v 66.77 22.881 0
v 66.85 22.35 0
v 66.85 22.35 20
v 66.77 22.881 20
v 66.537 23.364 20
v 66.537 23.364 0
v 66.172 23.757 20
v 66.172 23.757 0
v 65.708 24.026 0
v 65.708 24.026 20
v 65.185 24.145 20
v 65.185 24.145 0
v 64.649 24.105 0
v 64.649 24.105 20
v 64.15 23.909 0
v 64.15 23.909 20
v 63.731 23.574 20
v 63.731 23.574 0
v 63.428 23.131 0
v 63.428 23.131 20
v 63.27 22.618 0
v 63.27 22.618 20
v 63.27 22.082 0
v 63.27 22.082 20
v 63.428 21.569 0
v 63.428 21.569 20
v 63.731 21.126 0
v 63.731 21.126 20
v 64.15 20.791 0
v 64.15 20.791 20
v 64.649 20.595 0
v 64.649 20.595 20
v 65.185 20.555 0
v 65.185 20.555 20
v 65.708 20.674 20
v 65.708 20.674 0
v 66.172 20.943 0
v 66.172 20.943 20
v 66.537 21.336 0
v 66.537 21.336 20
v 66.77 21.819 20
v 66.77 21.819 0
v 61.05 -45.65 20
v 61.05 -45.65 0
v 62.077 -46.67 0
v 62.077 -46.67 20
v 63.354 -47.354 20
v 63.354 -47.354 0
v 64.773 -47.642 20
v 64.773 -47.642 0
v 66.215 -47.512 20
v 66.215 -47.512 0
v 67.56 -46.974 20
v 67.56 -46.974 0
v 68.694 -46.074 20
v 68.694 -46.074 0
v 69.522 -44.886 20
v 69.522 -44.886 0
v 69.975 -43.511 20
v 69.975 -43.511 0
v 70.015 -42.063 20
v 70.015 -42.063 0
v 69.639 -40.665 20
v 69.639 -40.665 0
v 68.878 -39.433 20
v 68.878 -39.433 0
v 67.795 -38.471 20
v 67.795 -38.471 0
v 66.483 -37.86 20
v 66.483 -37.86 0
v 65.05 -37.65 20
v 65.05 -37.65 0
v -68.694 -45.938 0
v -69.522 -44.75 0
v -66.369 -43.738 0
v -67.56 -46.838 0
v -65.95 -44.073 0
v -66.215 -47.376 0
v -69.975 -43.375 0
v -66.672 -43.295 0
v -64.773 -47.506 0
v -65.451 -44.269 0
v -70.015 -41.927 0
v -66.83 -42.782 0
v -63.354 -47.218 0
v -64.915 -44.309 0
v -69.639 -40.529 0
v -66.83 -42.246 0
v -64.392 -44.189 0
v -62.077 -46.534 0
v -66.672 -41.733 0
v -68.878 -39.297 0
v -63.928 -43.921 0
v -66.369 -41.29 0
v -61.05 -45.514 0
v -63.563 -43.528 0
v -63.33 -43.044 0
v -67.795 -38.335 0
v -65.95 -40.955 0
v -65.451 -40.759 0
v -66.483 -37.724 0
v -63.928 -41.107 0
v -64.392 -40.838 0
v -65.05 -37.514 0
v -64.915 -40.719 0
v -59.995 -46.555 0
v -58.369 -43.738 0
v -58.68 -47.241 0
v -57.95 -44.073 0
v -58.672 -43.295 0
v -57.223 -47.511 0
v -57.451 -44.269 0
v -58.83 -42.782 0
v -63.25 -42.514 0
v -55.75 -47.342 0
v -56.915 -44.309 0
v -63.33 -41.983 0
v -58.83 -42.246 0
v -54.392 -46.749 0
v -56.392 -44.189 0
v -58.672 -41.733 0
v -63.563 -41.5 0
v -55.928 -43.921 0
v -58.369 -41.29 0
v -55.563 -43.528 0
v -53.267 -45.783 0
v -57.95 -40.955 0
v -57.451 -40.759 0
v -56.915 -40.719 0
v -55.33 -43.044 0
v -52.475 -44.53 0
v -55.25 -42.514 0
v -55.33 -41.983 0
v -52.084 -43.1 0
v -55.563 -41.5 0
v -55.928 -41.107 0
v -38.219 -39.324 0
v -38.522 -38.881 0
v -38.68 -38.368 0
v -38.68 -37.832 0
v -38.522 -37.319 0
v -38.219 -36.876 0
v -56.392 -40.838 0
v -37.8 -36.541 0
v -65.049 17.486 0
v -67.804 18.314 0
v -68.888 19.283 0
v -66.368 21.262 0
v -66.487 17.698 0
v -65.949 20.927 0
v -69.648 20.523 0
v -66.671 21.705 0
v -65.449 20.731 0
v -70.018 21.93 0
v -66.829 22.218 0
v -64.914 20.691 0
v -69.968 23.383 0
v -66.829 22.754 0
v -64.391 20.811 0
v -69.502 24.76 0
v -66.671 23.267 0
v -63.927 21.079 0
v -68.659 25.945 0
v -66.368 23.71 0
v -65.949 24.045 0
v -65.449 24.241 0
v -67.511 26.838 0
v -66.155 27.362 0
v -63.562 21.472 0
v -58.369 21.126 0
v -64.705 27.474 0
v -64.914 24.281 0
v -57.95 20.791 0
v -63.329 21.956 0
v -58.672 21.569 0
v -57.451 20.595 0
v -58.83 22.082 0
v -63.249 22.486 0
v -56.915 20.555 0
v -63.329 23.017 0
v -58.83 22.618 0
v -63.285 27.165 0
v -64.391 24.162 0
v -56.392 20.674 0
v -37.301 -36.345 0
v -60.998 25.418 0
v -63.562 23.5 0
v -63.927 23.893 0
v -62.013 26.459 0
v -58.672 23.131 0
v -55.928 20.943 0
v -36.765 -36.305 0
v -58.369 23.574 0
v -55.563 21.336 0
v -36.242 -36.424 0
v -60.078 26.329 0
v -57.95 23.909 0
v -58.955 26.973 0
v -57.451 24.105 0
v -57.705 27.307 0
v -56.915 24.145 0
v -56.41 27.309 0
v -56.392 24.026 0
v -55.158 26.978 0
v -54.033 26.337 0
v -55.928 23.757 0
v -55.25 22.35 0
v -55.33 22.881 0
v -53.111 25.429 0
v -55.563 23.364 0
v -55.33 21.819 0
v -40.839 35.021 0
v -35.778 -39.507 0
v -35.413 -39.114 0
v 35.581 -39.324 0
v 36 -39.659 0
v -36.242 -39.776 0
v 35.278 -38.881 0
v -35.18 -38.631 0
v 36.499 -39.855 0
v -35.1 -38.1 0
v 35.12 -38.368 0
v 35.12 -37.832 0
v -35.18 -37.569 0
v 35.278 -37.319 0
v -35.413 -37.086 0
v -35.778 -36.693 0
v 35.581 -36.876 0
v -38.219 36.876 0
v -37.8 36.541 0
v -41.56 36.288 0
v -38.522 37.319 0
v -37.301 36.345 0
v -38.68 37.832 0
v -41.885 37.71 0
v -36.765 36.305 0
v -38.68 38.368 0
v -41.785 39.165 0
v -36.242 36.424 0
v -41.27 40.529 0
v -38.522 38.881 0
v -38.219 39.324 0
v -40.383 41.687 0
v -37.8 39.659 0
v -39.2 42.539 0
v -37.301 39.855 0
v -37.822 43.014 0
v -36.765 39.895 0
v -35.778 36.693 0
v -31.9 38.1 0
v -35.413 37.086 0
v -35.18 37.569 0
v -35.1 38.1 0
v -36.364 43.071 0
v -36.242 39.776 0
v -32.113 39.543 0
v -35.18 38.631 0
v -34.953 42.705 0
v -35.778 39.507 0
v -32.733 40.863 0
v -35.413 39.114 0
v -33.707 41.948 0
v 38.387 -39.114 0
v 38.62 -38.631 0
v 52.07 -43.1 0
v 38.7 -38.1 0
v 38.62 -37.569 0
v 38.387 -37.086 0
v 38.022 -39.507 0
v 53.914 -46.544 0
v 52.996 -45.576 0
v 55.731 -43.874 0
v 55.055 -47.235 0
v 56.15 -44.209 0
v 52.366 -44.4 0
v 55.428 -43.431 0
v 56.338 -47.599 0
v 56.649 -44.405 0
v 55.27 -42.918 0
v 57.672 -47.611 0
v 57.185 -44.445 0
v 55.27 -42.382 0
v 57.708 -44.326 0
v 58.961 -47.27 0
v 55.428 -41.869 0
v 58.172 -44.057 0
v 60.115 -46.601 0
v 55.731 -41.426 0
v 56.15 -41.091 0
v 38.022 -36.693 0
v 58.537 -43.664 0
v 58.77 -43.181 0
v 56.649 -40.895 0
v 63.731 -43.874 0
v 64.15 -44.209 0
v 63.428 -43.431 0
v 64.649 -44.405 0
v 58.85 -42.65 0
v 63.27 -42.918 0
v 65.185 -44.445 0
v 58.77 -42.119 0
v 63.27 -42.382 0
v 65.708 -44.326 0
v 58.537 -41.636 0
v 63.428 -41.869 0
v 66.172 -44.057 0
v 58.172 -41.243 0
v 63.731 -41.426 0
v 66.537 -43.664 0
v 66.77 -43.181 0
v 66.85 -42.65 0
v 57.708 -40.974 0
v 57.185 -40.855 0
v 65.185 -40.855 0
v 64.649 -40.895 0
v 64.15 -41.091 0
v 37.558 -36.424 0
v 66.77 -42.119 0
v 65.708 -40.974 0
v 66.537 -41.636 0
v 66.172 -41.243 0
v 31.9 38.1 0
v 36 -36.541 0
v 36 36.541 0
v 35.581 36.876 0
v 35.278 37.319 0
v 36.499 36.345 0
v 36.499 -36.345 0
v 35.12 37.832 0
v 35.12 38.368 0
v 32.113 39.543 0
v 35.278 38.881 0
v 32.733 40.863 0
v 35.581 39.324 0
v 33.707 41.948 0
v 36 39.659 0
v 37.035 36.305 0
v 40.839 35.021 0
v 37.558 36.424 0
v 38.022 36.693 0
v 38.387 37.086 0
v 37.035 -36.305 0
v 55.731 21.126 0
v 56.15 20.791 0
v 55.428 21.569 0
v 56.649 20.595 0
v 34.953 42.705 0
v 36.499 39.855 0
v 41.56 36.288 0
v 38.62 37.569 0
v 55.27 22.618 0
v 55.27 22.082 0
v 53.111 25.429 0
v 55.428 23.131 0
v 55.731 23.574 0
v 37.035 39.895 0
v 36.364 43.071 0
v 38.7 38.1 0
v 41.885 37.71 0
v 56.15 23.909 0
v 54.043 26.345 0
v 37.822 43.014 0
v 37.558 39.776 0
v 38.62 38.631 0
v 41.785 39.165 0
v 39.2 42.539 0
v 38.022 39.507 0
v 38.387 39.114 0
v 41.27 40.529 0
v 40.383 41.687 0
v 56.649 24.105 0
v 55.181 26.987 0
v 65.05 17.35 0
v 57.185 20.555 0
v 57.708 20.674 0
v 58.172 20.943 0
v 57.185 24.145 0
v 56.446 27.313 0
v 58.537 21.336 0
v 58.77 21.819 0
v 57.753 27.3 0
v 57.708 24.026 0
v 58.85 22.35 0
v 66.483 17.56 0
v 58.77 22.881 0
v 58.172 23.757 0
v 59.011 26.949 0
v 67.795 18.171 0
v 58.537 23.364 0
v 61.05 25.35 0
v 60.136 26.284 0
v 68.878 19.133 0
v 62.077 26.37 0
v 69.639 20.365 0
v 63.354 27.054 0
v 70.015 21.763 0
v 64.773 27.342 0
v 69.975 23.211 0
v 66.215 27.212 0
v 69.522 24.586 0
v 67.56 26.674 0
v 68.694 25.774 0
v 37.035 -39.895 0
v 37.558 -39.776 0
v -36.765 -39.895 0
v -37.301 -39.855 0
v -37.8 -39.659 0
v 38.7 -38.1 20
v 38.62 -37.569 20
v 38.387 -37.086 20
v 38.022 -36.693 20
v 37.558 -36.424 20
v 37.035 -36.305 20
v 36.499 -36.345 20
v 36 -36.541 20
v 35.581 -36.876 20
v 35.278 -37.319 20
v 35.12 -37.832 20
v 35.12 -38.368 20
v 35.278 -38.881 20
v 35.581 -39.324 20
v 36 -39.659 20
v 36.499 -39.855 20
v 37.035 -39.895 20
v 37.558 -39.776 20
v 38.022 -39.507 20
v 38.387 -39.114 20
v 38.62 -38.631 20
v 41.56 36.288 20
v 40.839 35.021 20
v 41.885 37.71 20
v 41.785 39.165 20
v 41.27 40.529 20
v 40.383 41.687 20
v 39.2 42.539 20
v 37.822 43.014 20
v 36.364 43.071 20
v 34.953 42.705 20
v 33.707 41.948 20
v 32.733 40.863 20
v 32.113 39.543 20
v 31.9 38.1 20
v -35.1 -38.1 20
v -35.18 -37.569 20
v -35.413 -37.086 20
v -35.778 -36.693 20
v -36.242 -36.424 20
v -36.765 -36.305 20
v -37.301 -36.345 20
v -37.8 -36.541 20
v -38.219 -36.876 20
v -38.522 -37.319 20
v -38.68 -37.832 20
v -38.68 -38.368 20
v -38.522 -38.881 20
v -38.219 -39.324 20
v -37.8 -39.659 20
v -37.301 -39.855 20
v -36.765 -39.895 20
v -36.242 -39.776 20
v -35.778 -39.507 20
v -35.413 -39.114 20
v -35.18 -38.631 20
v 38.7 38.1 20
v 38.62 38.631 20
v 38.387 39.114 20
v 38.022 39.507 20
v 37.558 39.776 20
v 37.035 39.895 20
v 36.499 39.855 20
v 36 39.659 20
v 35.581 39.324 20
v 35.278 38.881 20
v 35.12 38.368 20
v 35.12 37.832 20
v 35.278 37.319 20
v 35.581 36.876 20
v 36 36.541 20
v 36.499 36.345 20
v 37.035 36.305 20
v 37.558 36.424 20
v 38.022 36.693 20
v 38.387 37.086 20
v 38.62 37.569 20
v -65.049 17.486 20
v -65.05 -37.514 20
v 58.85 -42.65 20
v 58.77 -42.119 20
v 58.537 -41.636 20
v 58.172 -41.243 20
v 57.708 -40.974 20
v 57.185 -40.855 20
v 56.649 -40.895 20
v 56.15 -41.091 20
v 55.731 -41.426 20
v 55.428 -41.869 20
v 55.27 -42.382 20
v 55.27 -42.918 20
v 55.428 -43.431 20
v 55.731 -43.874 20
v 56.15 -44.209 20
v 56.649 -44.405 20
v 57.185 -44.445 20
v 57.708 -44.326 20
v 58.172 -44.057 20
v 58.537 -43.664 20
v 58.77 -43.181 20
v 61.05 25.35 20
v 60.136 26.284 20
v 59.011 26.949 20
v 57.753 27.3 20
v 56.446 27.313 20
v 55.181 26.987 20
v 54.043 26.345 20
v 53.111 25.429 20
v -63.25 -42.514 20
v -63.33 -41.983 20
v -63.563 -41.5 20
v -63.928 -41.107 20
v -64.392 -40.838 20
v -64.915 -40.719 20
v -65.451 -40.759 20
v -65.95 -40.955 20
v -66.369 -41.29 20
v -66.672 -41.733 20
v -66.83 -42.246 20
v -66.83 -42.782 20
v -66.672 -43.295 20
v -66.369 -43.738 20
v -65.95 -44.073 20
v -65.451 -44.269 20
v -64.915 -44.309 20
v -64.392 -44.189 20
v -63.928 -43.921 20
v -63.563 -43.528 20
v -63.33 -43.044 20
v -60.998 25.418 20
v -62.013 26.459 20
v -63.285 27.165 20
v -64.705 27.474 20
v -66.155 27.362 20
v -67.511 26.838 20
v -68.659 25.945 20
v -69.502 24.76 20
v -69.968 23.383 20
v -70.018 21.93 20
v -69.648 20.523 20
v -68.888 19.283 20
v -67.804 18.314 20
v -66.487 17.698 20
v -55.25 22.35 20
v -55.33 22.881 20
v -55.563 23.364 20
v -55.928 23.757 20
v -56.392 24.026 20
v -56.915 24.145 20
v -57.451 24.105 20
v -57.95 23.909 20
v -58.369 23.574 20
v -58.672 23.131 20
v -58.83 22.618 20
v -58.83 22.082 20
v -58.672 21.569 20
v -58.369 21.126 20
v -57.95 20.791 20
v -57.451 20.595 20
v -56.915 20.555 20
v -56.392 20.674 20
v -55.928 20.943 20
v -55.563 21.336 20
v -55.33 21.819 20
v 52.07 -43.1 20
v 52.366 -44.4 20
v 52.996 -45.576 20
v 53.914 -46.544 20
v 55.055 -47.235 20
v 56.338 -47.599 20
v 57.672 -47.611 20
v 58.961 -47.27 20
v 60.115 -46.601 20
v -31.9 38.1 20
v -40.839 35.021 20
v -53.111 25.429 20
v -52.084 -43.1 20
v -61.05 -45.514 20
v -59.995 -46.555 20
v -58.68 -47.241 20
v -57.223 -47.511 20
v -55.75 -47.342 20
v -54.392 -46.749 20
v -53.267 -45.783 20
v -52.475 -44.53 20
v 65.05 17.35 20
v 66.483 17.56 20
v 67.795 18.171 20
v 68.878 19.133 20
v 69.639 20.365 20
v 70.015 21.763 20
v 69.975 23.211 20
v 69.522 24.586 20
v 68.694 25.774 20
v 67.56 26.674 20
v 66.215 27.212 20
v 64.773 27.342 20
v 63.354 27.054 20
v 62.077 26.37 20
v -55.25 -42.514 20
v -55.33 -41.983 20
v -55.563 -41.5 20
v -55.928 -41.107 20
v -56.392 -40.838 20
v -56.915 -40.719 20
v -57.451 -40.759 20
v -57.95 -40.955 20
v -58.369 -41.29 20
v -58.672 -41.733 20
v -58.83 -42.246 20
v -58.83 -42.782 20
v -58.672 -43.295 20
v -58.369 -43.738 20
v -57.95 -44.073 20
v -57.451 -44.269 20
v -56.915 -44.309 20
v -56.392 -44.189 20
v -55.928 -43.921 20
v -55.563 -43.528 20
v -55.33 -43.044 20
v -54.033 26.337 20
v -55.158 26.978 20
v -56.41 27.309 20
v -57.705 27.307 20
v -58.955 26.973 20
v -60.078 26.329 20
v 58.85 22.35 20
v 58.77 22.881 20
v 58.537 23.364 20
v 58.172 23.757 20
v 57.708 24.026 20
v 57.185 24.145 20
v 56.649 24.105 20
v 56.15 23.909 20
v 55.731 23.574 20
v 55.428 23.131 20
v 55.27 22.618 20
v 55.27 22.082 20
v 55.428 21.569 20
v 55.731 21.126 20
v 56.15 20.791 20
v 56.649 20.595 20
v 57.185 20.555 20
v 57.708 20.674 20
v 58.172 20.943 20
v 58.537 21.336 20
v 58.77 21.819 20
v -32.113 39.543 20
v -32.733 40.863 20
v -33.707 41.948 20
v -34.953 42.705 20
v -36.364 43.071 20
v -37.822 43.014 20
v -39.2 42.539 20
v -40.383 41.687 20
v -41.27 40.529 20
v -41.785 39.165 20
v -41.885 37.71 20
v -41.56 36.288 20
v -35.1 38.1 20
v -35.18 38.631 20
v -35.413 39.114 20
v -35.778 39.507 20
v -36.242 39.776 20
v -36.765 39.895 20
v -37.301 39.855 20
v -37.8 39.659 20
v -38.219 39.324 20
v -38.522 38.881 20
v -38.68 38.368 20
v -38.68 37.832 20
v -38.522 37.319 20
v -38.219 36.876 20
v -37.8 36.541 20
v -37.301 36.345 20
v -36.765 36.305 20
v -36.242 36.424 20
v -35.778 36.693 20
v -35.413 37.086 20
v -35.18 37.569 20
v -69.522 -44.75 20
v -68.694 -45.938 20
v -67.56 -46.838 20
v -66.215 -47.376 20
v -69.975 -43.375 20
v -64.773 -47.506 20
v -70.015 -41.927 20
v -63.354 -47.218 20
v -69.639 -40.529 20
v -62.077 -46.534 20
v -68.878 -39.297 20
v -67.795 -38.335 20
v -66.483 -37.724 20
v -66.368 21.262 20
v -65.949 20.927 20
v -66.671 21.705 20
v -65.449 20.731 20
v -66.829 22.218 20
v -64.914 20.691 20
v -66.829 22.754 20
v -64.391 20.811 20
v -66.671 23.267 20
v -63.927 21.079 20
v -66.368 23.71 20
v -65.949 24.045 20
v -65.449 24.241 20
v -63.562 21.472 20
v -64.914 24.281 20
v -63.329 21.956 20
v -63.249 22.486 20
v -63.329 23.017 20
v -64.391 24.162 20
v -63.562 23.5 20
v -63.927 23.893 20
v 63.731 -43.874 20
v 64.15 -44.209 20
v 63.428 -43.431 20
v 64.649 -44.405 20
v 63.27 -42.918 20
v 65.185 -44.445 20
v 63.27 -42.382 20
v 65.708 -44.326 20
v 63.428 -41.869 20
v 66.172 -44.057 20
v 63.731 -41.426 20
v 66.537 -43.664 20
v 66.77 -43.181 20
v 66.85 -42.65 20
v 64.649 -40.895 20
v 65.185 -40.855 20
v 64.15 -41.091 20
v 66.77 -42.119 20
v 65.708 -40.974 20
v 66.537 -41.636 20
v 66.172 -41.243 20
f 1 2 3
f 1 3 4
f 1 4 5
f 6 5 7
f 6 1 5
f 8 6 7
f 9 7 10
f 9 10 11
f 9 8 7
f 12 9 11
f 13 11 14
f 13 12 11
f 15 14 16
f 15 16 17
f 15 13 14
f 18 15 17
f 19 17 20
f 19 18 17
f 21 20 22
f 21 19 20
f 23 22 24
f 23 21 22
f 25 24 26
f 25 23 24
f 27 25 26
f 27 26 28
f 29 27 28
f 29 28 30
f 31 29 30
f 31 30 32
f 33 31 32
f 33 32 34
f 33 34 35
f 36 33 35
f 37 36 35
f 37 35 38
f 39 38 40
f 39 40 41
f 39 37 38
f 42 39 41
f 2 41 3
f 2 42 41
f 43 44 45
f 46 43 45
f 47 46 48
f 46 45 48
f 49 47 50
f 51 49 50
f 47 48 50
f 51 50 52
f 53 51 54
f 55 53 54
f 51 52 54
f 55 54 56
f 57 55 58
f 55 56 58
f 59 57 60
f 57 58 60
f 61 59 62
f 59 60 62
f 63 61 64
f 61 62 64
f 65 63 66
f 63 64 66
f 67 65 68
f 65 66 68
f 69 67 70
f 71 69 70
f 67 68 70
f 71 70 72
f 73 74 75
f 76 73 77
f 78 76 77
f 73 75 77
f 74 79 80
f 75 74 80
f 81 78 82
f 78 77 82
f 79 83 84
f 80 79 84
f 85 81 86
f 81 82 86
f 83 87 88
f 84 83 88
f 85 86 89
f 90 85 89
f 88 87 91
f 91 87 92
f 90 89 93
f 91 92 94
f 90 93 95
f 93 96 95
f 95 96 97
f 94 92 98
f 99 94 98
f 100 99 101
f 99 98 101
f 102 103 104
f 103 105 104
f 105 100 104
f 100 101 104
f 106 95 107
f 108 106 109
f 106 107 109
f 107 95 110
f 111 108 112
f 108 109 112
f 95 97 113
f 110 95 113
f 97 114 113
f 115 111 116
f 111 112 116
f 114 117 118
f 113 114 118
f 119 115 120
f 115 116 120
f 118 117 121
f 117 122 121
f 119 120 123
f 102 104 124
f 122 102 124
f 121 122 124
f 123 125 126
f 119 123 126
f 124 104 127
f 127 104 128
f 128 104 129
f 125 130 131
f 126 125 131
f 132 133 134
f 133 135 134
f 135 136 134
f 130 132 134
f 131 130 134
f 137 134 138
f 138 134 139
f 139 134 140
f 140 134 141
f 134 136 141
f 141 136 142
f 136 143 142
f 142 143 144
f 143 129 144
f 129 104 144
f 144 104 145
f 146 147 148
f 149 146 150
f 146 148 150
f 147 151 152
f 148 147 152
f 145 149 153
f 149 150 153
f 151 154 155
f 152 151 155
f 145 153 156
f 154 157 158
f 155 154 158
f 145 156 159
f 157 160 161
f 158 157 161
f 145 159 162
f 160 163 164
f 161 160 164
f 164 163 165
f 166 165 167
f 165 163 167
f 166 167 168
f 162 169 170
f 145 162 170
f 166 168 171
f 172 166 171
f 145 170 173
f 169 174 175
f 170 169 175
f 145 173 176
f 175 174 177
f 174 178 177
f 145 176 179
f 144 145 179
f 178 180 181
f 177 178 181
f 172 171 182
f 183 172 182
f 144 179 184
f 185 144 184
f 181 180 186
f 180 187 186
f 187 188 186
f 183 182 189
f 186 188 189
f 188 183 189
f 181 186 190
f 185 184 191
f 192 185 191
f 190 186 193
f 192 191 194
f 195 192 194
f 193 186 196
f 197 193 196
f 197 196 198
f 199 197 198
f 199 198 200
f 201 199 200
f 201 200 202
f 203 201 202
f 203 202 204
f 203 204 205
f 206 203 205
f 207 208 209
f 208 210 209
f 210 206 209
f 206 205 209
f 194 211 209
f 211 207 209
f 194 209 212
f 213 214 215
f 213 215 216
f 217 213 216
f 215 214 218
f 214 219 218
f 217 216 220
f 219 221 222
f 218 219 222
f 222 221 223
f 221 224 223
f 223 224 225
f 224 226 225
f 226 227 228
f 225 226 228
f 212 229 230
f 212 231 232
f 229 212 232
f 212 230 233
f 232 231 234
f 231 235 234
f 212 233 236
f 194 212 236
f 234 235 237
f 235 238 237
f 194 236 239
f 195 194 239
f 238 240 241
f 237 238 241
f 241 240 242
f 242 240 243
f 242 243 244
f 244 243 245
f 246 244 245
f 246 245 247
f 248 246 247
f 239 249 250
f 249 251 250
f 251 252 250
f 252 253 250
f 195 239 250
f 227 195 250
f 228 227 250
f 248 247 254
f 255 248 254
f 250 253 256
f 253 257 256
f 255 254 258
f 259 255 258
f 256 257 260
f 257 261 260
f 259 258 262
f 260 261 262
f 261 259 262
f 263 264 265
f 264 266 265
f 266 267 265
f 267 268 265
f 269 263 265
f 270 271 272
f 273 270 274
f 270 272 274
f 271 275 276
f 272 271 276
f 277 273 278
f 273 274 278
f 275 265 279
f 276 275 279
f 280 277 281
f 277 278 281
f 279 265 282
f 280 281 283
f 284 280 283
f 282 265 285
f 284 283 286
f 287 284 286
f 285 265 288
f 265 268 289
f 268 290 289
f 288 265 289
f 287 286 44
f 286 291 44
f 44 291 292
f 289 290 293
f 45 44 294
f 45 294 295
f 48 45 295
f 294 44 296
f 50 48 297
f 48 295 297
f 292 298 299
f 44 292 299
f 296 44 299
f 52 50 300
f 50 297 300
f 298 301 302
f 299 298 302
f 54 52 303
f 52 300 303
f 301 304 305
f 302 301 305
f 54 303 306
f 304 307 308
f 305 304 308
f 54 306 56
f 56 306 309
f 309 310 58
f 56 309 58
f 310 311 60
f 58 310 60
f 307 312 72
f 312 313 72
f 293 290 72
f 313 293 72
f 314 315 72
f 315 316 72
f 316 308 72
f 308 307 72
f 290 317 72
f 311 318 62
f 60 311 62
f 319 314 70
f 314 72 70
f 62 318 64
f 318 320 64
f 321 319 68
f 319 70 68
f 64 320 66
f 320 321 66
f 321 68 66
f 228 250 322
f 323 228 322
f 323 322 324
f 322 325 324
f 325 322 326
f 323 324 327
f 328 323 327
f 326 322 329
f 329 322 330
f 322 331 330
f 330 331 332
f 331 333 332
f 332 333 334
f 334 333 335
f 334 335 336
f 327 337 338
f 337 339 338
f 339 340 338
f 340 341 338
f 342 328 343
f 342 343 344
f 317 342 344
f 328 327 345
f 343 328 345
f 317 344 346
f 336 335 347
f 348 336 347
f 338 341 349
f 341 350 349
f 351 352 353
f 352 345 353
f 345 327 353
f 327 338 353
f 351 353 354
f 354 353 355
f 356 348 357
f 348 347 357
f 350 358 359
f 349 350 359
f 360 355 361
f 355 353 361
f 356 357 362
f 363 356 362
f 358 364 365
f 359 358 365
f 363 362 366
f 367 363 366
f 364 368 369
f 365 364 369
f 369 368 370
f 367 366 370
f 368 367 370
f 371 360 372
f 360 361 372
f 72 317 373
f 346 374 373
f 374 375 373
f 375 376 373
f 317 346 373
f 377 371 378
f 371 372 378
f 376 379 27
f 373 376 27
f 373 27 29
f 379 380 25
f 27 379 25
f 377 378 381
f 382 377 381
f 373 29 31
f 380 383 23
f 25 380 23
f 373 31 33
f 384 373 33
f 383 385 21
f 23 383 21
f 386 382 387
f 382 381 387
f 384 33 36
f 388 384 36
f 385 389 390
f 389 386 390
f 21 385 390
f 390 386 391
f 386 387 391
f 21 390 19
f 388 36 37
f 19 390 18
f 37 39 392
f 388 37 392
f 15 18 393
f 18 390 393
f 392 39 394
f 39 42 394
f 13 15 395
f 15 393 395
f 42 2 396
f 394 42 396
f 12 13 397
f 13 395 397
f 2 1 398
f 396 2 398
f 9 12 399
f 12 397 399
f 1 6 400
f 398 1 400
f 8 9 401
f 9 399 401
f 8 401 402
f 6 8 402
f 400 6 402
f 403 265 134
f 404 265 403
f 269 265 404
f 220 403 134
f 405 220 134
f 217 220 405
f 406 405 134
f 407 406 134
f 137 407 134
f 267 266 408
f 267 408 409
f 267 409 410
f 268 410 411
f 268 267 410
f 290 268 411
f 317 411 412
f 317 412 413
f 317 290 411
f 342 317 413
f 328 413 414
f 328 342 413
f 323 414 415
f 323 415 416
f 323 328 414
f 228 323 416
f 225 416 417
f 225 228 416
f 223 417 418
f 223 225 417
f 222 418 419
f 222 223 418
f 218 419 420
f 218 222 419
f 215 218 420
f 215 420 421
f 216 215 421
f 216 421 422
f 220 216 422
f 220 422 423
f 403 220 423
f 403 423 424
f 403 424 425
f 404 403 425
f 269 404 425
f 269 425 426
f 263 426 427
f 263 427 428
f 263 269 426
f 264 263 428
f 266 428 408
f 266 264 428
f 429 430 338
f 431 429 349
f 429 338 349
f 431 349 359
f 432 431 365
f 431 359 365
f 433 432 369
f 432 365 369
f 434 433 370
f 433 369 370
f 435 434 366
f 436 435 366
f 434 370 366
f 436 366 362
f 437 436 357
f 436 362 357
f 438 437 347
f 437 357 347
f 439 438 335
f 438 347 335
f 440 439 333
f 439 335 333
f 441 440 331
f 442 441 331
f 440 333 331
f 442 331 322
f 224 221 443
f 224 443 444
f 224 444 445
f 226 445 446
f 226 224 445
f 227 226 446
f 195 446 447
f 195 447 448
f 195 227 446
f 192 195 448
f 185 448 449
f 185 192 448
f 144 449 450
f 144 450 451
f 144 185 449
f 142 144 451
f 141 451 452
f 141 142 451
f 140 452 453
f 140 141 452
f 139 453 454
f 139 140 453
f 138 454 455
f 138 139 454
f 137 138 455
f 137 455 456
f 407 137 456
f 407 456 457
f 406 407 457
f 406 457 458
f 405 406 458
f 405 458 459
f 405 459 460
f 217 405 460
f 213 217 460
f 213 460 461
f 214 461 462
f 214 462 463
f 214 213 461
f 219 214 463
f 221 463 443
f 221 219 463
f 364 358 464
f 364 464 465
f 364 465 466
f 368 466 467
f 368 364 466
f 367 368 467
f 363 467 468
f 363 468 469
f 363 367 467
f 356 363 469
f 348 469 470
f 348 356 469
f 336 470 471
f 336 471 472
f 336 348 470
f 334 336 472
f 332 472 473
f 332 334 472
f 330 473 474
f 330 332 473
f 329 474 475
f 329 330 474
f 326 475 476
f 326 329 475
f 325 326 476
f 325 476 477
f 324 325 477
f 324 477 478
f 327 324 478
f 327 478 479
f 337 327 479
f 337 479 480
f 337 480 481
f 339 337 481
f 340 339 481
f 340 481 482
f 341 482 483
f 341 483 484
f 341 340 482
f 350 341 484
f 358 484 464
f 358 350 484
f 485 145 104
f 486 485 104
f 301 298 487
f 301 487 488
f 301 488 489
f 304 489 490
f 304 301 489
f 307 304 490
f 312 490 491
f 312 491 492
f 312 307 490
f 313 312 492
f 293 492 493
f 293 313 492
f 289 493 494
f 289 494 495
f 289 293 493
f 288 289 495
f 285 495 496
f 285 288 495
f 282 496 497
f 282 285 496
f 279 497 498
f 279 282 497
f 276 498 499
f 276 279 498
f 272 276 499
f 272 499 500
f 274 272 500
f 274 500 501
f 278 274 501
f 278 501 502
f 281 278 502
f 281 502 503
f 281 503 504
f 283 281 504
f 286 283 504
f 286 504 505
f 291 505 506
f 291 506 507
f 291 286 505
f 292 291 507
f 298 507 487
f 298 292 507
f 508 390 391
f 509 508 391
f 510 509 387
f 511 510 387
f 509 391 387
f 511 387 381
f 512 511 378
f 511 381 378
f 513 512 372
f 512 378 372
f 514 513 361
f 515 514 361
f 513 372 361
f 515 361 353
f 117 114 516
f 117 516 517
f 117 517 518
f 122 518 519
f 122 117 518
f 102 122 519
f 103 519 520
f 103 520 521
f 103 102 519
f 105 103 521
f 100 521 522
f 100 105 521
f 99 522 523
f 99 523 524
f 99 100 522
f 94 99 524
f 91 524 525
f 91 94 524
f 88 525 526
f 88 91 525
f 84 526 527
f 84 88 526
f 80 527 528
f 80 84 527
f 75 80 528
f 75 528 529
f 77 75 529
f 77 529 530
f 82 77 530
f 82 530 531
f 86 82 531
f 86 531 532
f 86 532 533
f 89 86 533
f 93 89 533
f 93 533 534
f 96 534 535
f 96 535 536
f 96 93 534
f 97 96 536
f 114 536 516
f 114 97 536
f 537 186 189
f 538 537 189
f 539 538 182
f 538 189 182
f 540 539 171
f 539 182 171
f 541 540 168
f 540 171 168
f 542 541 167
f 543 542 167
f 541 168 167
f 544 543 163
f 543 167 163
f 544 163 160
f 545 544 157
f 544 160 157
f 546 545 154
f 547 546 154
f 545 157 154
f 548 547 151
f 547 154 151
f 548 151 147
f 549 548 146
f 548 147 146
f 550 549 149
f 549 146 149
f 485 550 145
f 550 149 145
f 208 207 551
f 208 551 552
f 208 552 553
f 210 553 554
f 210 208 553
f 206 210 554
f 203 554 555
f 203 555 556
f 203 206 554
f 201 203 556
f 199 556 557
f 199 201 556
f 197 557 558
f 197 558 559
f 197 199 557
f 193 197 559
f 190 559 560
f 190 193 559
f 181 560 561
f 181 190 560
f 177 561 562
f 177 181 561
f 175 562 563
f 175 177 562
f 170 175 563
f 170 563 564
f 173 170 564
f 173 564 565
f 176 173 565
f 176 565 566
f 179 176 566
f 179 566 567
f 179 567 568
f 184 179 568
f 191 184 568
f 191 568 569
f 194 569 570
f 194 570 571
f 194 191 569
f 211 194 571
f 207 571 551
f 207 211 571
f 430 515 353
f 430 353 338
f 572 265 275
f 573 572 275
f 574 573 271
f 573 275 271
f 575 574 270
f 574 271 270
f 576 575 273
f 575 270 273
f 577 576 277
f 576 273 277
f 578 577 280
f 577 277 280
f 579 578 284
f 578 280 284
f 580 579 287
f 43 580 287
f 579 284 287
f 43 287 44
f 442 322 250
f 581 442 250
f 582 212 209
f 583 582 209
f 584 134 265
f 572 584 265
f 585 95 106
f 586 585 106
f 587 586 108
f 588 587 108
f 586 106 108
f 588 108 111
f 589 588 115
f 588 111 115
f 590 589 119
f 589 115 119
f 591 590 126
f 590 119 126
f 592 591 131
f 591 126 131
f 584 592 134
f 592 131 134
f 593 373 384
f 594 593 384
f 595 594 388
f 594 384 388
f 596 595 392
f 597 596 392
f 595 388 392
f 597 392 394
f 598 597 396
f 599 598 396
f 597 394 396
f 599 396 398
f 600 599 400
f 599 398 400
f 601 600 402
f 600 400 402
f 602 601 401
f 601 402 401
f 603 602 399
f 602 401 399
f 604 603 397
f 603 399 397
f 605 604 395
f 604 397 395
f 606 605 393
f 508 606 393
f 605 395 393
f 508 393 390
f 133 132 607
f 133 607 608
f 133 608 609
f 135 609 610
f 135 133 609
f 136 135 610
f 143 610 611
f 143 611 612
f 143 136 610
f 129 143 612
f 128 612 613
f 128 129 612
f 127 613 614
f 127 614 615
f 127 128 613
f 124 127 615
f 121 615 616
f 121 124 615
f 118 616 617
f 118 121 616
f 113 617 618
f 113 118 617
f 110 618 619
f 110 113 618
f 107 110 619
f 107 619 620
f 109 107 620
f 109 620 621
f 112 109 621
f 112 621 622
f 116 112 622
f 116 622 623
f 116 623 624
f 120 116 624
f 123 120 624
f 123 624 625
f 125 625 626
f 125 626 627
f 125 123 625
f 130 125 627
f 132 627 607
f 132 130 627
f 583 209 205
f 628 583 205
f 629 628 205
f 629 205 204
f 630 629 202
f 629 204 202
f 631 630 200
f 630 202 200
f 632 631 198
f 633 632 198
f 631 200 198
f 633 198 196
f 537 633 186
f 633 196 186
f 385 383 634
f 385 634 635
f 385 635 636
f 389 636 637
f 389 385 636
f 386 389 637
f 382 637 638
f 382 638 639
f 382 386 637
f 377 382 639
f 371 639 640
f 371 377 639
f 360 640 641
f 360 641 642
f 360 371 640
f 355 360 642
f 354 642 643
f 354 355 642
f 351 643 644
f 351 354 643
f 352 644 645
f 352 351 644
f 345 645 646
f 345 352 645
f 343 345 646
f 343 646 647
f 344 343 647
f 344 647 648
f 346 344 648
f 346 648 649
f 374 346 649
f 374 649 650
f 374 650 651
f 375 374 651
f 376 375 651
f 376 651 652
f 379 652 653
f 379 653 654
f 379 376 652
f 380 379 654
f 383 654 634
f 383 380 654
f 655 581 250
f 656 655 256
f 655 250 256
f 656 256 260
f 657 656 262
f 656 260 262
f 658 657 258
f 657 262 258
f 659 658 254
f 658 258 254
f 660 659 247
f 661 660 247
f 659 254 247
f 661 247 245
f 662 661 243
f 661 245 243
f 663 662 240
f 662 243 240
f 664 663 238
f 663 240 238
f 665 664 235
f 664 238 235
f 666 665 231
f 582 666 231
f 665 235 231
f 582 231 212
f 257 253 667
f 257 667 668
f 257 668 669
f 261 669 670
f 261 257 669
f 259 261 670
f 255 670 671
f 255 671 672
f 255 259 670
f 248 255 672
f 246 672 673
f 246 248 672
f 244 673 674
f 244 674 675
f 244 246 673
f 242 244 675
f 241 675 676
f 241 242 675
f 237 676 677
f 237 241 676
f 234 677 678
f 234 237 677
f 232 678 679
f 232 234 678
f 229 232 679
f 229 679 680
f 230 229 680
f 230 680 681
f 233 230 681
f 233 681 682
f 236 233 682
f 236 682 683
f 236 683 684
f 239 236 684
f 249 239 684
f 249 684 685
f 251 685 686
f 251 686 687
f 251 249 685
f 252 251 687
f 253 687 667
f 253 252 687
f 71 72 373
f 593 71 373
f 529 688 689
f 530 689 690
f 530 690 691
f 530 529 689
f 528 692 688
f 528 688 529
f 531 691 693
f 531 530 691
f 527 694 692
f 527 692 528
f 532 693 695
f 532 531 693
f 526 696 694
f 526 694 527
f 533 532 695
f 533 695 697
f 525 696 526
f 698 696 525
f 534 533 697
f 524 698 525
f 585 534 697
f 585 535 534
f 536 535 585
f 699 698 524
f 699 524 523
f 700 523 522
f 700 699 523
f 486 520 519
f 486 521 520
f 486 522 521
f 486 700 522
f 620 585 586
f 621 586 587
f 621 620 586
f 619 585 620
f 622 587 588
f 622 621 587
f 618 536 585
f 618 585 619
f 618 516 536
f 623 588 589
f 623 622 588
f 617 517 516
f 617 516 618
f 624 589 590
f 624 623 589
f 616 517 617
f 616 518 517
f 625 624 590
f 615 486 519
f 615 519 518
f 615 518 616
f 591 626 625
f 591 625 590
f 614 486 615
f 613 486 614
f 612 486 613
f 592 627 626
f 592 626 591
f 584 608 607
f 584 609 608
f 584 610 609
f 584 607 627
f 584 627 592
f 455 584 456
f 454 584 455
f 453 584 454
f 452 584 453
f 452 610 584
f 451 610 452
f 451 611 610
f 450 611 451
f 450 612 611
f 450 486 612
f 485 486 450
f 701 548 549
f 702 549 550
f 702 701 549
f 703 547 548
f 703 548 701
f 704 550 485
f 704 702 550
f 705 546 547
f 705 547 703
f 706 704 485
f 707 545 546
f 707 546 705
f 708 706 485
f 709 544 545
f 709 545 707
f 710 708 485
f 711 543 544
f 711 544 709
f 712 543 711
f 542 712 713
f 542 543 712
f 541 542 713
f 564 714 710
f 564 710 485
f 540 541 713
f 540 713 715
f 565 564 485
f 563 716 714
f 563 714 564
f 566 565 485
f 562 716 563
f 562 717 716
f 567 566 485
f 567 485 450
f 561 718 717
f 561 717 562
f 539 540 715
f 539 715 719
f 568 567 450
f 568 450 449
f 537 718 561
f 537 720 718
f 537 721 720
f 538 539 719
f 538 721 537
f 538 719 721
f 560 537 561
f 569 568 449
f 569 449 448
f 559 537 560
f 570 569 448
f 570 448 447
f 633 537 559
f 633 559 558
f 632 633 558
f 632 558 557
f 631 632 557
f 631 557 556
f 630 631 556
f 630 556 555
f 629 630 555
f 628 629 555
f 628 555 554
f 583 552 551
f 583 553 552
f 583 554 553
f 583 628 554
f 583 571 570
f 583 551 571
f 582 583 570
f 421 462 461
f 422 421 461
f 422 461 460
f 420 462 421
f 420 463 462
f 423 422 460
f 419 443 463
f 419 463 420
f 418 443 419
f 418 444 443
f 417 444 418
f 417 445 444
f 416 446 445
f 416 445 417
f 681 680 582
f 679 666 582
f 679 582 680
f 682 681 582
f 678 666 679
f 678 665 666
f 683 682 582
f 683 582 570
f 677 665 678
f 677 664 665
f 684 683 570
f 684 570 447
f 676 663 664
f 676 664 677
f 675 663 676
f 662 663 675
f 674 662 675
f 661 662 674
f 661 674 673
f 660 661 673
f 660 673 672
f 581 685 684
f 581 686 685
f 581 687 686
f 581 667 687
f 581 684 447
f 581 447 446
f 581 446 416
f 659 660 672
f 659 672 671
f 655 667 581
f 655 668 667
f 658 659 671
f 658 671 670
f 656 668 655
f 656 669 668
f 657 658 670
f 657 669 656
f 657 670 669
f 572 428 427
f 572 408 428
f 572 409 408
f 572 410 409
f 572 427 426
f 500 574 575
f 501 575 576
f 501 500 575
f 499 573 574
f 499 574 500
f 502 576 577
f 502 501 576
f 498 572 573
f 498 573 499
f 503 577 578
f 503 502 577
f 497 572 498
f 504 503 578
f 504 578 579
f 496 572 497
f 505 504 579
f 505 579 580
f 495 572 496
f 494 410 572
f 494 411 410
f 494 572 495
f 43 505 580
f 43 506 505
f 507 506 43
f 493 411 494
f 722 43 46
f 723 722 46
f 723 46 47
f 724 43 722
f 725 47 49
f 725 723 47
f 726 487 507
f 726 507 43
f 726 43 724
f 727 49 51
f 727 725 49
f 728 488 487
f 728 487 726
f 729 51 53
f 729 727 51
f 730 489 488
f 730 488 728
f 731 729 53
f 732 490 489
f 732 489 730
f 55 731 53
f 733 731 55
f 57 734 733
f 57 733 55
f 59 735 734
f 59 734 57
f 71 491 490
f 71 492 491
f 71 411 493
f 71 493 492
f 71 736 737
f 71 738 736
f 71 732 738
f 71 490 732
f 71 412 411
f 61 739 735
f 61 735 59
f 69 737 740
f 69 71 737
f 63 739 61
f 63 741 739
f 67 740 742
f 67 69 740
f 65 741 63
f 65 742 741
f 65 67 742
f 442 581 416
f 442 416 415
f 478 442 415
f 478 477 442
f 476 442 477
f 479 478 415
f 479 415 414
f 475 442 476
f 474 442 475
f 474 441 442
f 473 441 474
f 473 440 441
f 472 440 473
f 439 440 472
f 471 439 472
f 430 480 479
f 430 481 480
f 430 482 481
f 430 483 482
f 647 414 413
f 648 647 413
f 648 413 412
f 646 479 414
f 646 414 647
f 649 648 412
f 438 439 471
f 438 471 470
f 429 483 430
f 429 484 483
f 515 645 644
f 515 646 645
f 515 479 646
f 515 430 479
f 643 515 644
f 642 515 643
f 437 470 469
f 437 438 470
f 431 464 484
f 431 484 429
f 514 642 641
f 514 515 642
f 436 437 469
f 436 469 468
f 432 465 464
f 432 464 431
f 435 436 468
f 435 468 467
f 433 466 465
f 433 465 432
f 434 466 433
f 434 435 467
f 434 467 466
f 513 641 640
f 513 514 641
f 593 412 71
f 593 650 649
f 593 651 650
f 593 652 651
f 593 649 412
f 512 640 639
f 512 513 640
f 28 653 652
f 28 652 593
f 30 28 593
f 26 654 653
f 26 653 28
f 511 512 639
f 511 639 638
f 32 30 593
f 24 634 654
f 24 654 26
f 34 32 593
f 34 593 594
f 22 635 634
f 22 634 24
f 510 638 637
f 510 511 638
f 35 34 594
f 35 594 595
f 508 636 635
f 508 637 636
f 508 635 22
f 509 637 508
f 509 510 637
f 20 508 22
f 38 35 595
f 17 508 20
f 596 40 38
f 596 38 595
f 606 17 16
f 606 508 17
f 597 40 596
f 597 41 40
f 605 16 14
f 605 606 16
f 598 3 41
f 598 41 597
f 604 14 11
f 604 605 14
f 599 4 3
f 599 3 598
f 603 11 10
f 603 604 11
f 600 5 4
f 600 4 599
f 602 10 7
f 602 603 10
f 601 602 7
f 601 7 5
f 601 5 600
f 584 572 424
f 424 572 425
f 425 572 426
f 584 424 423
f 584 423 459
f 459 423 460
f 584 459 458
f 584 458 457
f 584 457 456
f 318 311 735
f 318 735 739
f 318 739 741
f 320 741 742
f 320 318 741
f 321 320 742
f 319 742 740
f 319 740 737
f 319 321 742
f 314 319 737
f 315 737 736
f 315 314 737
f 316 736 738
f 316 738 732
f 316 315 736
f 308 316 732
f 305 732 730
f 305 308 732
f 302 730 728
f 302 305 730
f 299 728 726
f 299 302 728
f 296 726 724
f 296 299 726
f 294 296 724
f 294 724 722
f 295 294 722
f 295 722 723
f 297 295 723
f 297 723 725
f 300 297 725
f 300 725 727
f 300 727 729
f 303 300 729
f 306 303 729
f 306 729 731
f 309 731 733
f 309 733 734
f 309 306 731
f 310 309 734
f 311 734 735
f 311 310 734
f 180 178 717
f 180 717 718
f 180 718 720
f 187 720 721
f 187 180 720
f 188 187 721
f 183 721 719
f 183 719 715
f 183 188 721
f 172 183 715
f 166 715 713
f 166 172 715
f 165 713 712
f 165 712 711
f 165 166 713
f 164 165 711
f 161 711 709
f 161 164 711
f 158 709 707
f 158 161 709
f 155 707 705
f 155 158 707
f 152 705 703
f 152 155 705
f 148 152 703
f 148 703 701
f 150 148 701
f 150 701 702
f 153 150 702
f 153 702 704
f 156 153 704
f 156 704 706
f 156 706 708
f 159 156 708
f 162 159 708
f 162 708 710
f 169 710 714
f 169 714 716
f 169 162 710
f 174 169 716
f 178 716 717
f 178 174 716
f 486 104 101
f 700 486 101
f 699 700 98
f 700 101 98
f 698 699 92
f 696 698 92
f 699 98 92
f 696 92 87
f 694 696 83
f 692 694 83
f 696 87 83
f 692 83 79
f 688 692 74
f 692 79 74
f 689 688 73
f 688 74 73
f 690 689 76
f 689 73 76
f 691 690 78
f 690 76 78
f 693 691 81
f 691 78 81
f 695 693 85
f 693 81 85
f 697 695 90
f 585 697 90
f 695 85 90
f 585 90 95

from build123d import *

# Parameters (mm, degrees)
SKETCH2_R           = 1.8
BOSS_EXTRUDE1_DEPTH = 20


with BuildPart() as part:
    # Sketch2 → Boss-Extrude1 (new body)
    with BuildSketch(Plane.XY):
        with BuildLine():
            ThreePointArc((-60.998373194, 25.417629235), (-69.501790799, 24.76016427), (-65.048841754, 17.486127155))
            Line((-65.048841754, 17.486127155), (-65.05, -37.513872835))
            ThreePointArc((-65.05, -37.513872835), (-69.522135955, -44.749940812), (-61.05, -45.513872835))
            ThreePointArc((-61.05, -45.513872835), (-55.750093871, -47.341941191), (-52.084473347, -43.1))
            Line((-52.084473347, -43.1), (-36.9, -43.1))
            Line((-36.9, -43.1), (36.9, -43.1))
            Line((36.9, -43.1), (52.070291173, -43.1))
            ThreePointArc((52.070291173, -43.1), (55.684136776, -47.459825117), (61.05, -45.65))
            ThreePointArc((61.05, -45.65), (69.522135955, -44.886067977), (65.05, -37.65))
            Line((65.05, -37.65), (65.05, 17.35))
            ThreePointArc((65.05, 17.35), (69.522135955, 24.586067977), (61.05, 25.35))
            ThreePointArc((61.05, 25.35), (57.099855684, 27.349751435), (53.110619235, 25.429168588))
            Line((53.110619235, 25.429168588), (40.839380765, 35.020831412))
            ThreePointArc((40.839380765, 35.020831412), (38.528357482, 42.827414929), (31.9, 38.1))
            Line((31.9, 38.1), (-31.9, 38.1))
            ThreePointArc((-31.9, 38.1), (-38.528357482, 42.827414929), (-40.839380765, 35.020831412))
            Line((-40.839380765, 35.020831412), (-53.110619235, 25.429168588))
            ThreePointArc((-53.110619235, 25.429168588), (-57.057314719, 27.349994649), (-60.998373194, 25.417629235))
        make_face()
        with Locations((-65.05, -42.513872835)):
            Circle(SKETCH2_R, mode=Mode.SUBTRACT)
        with Locations((-57.05, -42.513872835)):
            Circle(SKETCH2_R, mode=Mode.SUBTRACT)
        with Locations((-36.9, -38.1)):
            Circle(SKETCH2_R, mode=Mode.SUBTRACT)
        with Locations((36.9, -38.1)):
            Circle(SKETCH2_R, mode=Mode.SUBTRACT)
        with Locations((57.05, -42.65)):
            Circle(SKETCH2_R, mode=Mode.SUBTRACT)
        with Locations((65.05, -42.65)):
            Circle(SKETCH2_R, mode=Mode.SUBTRACT)
        with Locations((-65.048841754, 22.486127155)):
            Circle(SKETCH2_R, mode=Mode.SUBTRACT)
        with Locations((-57.05, 22.35)):
            Circle(SKETCH2_R, mode=Mode.SUBTRACT)
        with Locations((-36.9, 38.1)):
            Circle(SKETCH2_R, mode=Mode.SUBTRACT)
        with Locations((57.05, 22.35)):
            Circle(SKETCH2_R, mode=Mode.SUBTRACT)
        with Locations((65.05, 22.35)):
            Circle(SKETCH2_R, mode=Mode.SUBTRACT)
        with Locations((36.9, 38.1)):
            Circle(SKETCH2_R, mode=Mode.SUBTRACT)
    extrude(amount=BOSS_EXTRUDE1_DEPTH)


solid = part.part
